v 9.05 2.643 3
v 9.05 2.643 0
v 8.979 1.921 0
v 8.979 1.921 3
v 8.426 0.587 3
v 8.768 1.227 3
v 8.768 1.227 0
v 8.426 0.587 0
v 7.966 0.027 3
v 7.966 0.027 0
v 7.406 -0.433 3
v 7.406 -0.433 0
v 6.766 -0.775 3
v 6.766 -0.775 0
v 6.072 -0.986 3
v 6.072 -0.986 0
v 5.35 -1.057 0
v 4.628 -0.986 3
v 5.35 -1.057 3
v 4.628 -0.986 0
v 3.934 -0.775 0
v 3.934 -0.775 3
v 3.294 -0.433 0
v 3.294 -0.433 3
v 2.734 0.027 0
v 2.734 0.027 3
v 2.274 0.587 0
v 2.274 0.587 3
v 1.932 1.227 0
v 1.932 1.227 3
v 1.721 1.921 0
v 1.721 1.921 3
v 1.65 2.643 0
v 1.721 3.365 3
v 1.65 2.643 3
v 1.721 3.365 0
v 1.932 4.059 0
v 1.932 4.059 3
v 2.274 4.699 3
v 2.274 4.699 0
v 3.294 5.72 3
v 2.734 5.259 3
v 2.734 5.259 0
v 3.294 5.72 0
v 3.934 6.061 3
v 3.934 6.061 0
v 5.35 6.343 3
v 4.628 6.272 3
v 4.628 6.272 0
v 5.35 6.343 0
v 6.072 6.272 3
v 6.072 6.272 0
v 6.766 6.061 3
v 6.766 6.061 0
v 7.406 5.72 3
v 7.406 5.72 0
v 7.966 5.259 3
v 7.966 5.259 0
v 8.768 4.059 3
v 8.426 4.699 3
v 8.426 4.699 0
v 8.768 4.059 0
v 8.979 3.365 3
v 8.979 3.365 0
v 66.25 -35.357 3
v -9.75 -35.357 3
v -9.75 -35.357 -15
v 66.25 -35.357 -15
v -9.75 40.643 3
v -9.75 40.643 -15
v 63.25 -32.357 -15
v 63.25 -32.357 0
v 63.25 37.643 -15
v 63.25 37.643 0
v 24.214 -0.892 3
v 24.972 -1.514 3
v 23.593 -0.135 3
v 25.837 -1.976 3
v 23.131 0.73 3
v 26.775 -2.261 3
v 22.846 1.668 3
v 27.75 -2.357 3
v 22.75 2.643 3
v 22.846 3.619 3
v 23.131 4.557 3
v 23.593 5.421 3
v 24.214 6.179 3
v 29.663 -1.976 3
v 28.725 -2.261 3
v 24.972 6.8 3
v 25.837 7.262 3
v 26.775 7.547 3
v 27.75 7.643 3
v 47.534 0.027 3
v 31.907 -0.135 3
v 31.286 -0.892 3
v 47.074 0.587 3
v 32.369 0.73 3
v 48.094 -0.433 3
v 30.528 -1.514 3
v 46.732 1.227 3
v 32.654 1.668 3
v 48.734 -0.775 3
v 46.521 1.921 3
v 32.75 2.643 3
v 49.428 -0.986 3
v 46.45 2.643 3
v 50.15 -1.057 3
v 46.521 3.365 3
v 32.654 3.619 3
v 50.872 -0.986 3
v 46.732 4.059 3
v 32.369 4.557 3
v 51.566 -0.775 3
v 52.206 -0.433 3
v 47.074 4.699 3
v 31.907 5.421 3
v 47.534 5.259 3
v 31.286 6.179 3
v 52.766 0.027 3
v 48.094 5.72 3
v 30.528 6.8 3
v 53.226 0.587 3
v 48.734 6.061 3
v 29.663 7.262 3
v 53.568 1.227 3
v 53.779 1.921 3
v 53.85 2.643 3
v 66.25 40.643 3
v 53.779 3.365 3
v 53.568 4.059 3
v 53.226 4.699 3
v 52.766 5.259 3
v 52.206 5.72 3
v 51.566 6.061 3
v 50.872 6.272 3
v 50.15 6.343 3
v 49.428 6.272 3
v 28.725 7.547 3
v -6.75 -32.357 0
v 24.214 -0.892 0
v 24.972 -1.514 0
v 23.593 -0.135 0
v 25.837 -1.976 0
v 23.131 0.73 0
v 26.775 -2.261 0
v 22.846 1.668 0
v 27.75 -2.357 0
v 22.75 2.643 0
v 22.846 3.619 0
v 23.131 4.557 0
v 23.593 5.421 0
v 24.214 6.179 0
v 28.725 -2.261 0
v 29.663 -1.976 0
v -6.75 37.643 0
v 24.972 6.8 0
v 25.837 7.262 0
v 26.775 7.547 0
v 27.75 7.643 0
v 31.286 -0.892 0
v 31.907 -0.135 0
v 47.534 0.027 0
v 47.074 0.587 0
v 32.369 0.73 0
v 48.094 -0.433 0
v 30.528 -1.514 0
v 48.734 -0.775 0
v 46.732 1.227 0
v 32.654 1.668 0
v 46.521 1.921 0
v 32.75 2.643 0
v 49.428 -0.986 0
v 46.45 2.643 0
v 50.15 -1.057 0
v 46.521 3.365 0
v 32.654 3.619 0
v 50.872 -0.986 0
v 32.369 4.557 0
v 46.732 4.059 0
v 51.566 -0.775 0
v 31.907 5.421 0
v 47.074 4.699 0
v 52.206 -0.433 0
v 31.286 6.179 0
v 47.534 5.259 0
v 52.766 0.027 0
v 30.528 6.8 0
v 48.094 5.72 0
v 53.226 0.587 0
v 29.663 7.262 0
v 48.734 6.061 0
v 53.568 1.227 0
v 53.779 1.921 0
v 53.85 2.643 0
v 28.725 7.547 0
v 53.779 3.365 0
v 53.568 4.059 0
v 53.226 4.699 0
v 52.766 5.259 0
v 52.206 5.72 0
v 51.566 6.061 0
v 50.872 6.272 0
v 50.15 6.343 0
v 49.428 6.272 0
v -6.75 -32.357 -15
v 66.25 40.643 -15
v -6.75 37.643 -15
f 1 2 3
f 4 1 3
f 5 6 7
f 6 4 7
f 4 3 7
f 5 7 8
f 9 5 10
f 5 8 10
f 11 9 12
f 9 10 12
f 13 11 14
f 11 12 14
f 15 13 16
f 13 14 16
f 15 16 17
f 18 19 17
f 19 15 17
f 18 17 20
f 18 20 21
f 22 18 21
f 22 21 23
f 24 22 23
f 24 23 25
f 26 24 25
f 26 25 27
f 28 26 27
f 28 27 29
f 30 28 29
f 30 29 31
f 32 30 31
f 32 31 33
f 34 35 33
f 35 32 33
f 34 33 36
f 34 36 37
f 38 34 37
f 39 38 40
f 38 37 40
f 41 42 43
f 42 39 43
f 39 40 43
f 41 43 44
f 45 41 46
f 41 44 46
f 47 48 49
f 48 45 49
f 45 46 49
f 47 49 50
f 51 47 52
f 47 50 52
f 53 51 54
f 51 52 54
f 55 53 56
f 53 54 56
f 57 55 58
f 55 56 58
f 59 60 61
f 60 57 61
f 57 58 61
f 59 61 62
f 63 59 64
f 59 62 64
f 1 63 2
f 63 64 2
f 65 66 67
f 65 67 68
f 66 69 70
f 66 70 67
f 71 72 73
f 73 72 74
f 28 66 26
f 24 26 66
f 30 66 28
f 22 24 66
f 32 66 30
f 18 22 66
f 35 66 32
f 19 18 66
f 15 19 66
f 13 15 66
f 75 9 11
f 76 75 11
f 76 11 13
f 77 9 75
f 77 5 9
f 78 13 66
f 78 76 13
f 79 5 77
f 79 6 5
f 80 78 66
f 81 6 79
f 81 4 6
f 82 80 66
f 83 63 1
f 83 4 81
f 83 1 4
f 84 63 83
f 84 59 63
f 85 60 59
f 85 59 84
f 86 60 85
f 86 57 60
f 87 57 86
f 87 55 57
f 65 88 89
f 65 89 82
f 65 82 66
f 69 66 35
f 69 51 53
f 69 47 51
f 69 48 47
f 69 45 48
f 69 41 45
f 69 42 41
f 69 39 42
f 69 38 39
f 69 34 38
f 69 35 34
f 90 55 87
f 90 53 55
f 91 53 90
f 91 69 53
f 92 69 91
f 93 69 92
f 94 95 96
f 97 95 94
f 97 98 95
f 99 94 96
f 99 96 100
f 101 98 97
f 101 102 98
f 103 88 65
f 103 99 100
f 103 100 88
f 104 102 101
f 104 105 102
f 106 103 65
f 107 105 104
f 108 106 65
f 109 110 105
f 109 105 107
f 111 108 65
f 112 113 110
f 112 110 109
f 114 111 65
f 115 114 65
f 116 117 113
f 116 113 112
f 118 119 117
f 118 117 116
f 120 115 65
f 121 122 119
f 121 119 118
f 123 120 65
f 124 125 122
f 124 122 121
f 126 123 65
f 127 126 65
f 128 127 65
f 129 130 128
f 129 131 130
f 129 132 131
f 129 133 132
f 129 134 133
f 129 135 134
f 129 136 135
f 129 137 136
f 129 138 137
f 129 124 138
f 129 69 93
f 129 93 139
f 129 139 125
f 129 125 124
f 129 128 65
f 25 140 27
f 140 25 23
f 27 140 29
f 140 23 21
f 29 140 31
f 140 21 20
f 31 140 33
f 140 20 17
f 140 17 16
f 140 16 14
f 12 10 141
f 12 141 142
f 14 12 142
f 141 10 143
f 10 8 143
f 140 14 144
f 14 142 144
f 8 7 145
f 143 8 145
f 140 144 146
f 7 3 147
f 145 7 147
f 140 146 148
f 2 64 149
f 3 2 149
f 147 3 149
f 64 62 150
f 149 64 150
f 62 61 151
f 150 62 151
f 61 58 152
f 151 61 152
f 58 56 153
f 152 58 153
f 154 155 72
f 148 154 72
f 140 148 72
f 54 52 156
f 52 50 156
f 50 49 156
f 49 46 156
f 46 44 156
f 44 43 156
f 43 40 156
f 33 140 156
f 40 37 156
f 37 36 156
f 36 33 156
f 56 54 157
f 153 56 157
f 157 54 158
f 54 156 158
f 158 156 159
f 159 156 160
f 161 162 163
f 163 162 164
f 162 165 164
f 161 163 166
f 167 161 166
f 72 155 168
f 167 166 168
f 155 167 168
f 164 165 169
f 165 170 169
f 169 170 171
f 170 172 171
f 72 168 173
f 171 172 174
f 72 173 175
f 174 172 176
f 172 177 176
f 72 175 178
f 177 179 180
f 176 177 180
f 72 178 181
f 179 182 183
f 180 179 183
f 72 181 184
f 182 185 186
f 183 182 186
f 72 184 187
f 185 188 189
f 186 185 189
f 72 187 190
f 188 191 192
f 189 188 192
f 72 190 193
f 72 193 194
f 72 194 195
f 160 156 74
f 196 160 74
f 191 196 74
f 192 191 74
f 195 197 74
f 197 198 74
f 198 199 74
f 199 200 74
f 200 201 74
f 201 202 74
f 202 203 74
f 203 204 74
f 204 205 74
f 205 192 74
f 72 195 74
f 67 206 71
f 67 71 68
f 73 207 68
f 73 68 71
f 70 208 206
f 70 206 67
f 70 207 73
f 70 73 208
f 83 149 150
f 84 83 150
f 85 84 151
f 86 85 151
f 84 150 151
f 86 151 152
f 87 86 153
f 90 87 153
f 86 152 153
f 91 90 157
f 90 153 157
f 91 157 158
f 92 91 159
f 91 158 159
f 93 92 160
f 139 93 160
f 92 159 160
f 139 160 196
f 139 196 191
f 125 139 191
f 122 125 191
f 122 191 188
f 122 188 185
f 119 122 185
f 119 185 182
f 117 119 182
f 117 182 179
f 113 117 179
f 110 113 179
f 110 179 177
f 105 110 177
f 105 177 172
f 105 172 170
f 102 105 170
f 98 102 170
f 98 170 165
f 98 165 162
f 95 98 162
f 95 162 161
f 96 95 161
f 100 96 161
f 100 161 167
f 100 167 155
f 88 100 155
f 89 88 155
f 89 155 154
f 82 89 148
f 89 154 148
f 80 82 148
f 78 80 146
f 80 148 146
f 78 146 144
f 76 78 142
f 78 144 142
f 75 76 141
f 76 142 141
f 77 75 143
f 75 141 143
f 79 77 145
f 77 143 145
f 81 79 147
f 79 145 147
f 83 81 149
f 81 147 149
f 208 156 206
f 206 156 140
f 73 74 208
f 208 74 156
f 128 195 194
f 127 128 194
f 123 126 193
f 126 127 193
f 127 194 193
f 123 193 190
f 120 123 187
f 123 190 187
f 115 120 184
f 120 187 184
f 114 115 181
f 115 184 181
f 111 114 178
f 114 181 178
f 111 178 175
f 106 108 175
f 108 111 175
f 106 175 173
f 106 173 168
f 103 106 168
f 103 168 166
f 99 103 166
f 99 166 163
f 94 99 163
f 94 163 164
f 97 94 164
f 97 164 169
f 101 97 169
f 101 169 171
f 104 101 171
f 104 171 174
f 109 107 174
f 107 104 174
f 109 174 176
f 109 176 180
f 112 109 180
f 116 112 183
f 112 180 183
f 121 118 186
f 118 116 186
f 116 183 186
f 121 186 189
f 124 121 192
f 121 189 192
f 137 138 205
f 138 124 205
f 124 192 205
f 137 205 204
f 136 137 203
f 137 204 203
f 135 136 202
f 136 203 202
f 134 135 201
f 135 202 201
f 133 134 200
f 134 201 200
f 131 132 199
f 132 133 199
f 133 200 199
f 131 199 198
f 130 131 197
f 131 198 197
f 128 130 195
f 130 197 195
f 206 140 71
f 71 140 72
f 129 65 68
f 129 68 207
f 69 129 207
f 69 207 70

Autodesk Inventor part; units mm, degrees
ref_plane "YZ Plane" through (0, 0, 0) normal (1, 0, 0) x (0, 1, 0)
ref_plane "XZ Plane" through (0, 0, 0) normal (0, 1, 0) x (-1, 0, 0)
ref_plane "XY Plane" through (0, 0, 0) normal (0, 0, 1) x (1, 0, 0)
sketch "Boceto1" plane through (0, 0, 0) normal (0, 0, 1) x (1, 0, 0)
  arc A0 (-1.75, 0) -> (-0.6468, -1.6261) centre (0, 0) ccw projected
  line L0 (-1.75, 0) -> (-1.75, 5.2862) projected
  arc A1 (-0.6468, 6.9123) -> (-1.75, 5.2862) centre (0, 5.2862) ccw projected
  line L1 (-0.6468, 6.9123) -> (12.6254, 12.1912) projected
  arc A2 (12.6254, 12.1912) -> (13.6116, 12.956) centre (11.7938, 14.2819) ccw projected
  arc A3 (41.8884, 12.956) -> (13.6116, 12.956) centre (27.75, 2.6431) ccw projected
  arc A4 (41.8884, 12.956) -> (42.8746, 12.1912) centre (43.7062, 14.2819) ccw projected
  line L2 (42.8746, 12.1912) -> (56.1468, 6.9123) projected
  arc A5 (57.25, 5.2862) -> (56.1468, 6.9123) centre (55.5, 5.2862) ccw projected
  line L3 (57.25, 5.2862) -> (57.25, 0) projected
  arc A6 (56.1468, -1.6261) -> (57.25, 0) centre (55.5, 0) ccw projected
  line L4 (56.1468, -1.6261) -> (42.8746, -6.905) projected
  arc A7 (42.8746, -6.905) -> (41.8884, -7.6698) centre (43.7062, -8.9957) ccw projected
  arc A8 (13.6116, -7.6698) -> (41.8884, -7.6698) centre (27.75, 2.6431) ccw projected
  arc A9 (13.6116, -7.6698) -> (12.6254, -6.905) centre (11.7938, -8.9957) ccw projected
  line L5 (12.6254, -6.905) -> (-0.6468, -1.6261) projected
  circle A10 centre (50.15, 2.6431) radius 3.7 projected
  circle A11 centre (5.35, 2.6431) radius 3.7 projected
  arc A12 (44.3063, 7.4106) -> (11.1937, 7.4106) centre (27.75, 2.6431) ccw projected
  arc A13 (11.1937, 7.4106) -> (11.3578, 5.7658) centre (13.3357, 6.7938) ccw projected
  arc A14 (11.3578, -0.4796) -> (11.3578, 5.7658) centre (5.35, 2.6431) ccw projected
  arc A15 (11.3578, -0.4796) -> (11.1937, -2.1244) centre (13.3357, -1.5076) ccw projected
  arc A16 (11.1937, -2.1244) -> (44.3063, -2.1244) centre (27.75, 2.6431) ccw projected
  arc A17 (44.3063, -2.1244) -> (44.1422, -0.4796) centre (42.1643, -1.5076) ccw projected
  arc A18 (44.1422, 5.7658) -> (44.1422, -0.4796) centre (50.15, 2.6431) ccw projected
  arc A19 (44.1422, 5.7658) -> (44.3063, 7.4106) centre (42.1643, 6.7938) ccw projected
  line L6 (-6.75, 37.6431) -> (63.25, 37.6431)
  line L7 (63.25, 37.6431) -> (63.25, -32.3569)
  line L8 (63.25, -32.3569) -> (-6.75, -32.3569)
  line L9 (-6.75, -32.3569) -> (-6.75, 37.6431)
  line L10 (-6.75, 2.6431) -> (63.25, 2.6431) construction
  point P0 (-1.75, 2.6431)
  dimension "d0" = 70
  dimension "d1" = 70
  dimension "d16" = 35
extrude "Extrusión1" add sketch "Boceto1" along normal blind 3 contours L0 A1 L1 A2 A3 A4 L2 A5 L3 A6 L4 A7 A8 A9 L5 A0 | A19 A18 A17 A16 A15 A14 A13 A12 | L6 L7 L8 L9
sketch "Boceto2" plane through (0, 0, 0) normal (0, 0, -1) x (-1, 0, 0)
  circle A0 centre (-27.75, 2.6431) radius 5 projected
  line L0 (6.75, -32.3569) -> (-63.25, -32.3569) projected
  line L1 (6.75, 37.6431) -> (6.75, -32.3569) projected
  line L2 (-63.25, 37.6431) -> (6.75, 37.6431) projected
  line L3 (-63.25, -32.3569) -> (-63.25, 37.6431) projected
  circle A1 centre (-5.35, 2.6431) radius 3.7 projected
  circle A2 centre (-50.15, 2.6431) radius 3.7 projected
  line L4 (-66.25, -35.3569) -> (9.75, -35.3569)
  line L5 (9.75, -35.3569) -> (9.75, 40.6431)
  line L6 (9.75, 40.6431) -> (-66.25, 40.6431)
  line L7 (-66.25, 40.6431) -> (-66.25, -35.3569)
  point P0 (0, 0)
  dimension "d6" = 3
extrude "Extrusión2" cut sketch "Boceto2" against normal through all contours A0
sketch "Boceto4" plane through (0, 0, 0) normal (0, 0, -1) x (-1, 0, 0)
  circle A0 centre (-27.75, 2.6431) radius 5 projected
  line L0 (6.75, -32.3569) -> (-63.25, -32.3569) projected
  line L1 (6.75, 37.6431) -> (6.75, -32.3569) projected
  line L2 (-63.25, 37.6431) -> (6.75, 37.6431) projected
  line L3 (-63.25, -32.3569) -> (-63.25, 37.6431) projected
  circle A1 centre (-5.35, 2.6431) radius 3.7 projected
  circle A2 centre (-50.15, 2.6431) radius 3.7 projected
  line L4 (9.75, -35.3569) -> (-66.25, -35.3569)
  line L5 (-66.25, -35.3569) -> (-66.25, 40.6431)
  line L6 (-66.25, 40.6431) -> (9.75, 40.6431)
  line L7 (9.75, 40.6431) -> (9.75, -35.3569)
  point P0 (0, 0)
  dimension "d9" = 3
extrude "Extrusión3" add sketch "Boceto4" along normal blind 15 and the other way blind 3 contours L4 L5 L6 L7
properties part number "estructura_sensor_chumacera"
